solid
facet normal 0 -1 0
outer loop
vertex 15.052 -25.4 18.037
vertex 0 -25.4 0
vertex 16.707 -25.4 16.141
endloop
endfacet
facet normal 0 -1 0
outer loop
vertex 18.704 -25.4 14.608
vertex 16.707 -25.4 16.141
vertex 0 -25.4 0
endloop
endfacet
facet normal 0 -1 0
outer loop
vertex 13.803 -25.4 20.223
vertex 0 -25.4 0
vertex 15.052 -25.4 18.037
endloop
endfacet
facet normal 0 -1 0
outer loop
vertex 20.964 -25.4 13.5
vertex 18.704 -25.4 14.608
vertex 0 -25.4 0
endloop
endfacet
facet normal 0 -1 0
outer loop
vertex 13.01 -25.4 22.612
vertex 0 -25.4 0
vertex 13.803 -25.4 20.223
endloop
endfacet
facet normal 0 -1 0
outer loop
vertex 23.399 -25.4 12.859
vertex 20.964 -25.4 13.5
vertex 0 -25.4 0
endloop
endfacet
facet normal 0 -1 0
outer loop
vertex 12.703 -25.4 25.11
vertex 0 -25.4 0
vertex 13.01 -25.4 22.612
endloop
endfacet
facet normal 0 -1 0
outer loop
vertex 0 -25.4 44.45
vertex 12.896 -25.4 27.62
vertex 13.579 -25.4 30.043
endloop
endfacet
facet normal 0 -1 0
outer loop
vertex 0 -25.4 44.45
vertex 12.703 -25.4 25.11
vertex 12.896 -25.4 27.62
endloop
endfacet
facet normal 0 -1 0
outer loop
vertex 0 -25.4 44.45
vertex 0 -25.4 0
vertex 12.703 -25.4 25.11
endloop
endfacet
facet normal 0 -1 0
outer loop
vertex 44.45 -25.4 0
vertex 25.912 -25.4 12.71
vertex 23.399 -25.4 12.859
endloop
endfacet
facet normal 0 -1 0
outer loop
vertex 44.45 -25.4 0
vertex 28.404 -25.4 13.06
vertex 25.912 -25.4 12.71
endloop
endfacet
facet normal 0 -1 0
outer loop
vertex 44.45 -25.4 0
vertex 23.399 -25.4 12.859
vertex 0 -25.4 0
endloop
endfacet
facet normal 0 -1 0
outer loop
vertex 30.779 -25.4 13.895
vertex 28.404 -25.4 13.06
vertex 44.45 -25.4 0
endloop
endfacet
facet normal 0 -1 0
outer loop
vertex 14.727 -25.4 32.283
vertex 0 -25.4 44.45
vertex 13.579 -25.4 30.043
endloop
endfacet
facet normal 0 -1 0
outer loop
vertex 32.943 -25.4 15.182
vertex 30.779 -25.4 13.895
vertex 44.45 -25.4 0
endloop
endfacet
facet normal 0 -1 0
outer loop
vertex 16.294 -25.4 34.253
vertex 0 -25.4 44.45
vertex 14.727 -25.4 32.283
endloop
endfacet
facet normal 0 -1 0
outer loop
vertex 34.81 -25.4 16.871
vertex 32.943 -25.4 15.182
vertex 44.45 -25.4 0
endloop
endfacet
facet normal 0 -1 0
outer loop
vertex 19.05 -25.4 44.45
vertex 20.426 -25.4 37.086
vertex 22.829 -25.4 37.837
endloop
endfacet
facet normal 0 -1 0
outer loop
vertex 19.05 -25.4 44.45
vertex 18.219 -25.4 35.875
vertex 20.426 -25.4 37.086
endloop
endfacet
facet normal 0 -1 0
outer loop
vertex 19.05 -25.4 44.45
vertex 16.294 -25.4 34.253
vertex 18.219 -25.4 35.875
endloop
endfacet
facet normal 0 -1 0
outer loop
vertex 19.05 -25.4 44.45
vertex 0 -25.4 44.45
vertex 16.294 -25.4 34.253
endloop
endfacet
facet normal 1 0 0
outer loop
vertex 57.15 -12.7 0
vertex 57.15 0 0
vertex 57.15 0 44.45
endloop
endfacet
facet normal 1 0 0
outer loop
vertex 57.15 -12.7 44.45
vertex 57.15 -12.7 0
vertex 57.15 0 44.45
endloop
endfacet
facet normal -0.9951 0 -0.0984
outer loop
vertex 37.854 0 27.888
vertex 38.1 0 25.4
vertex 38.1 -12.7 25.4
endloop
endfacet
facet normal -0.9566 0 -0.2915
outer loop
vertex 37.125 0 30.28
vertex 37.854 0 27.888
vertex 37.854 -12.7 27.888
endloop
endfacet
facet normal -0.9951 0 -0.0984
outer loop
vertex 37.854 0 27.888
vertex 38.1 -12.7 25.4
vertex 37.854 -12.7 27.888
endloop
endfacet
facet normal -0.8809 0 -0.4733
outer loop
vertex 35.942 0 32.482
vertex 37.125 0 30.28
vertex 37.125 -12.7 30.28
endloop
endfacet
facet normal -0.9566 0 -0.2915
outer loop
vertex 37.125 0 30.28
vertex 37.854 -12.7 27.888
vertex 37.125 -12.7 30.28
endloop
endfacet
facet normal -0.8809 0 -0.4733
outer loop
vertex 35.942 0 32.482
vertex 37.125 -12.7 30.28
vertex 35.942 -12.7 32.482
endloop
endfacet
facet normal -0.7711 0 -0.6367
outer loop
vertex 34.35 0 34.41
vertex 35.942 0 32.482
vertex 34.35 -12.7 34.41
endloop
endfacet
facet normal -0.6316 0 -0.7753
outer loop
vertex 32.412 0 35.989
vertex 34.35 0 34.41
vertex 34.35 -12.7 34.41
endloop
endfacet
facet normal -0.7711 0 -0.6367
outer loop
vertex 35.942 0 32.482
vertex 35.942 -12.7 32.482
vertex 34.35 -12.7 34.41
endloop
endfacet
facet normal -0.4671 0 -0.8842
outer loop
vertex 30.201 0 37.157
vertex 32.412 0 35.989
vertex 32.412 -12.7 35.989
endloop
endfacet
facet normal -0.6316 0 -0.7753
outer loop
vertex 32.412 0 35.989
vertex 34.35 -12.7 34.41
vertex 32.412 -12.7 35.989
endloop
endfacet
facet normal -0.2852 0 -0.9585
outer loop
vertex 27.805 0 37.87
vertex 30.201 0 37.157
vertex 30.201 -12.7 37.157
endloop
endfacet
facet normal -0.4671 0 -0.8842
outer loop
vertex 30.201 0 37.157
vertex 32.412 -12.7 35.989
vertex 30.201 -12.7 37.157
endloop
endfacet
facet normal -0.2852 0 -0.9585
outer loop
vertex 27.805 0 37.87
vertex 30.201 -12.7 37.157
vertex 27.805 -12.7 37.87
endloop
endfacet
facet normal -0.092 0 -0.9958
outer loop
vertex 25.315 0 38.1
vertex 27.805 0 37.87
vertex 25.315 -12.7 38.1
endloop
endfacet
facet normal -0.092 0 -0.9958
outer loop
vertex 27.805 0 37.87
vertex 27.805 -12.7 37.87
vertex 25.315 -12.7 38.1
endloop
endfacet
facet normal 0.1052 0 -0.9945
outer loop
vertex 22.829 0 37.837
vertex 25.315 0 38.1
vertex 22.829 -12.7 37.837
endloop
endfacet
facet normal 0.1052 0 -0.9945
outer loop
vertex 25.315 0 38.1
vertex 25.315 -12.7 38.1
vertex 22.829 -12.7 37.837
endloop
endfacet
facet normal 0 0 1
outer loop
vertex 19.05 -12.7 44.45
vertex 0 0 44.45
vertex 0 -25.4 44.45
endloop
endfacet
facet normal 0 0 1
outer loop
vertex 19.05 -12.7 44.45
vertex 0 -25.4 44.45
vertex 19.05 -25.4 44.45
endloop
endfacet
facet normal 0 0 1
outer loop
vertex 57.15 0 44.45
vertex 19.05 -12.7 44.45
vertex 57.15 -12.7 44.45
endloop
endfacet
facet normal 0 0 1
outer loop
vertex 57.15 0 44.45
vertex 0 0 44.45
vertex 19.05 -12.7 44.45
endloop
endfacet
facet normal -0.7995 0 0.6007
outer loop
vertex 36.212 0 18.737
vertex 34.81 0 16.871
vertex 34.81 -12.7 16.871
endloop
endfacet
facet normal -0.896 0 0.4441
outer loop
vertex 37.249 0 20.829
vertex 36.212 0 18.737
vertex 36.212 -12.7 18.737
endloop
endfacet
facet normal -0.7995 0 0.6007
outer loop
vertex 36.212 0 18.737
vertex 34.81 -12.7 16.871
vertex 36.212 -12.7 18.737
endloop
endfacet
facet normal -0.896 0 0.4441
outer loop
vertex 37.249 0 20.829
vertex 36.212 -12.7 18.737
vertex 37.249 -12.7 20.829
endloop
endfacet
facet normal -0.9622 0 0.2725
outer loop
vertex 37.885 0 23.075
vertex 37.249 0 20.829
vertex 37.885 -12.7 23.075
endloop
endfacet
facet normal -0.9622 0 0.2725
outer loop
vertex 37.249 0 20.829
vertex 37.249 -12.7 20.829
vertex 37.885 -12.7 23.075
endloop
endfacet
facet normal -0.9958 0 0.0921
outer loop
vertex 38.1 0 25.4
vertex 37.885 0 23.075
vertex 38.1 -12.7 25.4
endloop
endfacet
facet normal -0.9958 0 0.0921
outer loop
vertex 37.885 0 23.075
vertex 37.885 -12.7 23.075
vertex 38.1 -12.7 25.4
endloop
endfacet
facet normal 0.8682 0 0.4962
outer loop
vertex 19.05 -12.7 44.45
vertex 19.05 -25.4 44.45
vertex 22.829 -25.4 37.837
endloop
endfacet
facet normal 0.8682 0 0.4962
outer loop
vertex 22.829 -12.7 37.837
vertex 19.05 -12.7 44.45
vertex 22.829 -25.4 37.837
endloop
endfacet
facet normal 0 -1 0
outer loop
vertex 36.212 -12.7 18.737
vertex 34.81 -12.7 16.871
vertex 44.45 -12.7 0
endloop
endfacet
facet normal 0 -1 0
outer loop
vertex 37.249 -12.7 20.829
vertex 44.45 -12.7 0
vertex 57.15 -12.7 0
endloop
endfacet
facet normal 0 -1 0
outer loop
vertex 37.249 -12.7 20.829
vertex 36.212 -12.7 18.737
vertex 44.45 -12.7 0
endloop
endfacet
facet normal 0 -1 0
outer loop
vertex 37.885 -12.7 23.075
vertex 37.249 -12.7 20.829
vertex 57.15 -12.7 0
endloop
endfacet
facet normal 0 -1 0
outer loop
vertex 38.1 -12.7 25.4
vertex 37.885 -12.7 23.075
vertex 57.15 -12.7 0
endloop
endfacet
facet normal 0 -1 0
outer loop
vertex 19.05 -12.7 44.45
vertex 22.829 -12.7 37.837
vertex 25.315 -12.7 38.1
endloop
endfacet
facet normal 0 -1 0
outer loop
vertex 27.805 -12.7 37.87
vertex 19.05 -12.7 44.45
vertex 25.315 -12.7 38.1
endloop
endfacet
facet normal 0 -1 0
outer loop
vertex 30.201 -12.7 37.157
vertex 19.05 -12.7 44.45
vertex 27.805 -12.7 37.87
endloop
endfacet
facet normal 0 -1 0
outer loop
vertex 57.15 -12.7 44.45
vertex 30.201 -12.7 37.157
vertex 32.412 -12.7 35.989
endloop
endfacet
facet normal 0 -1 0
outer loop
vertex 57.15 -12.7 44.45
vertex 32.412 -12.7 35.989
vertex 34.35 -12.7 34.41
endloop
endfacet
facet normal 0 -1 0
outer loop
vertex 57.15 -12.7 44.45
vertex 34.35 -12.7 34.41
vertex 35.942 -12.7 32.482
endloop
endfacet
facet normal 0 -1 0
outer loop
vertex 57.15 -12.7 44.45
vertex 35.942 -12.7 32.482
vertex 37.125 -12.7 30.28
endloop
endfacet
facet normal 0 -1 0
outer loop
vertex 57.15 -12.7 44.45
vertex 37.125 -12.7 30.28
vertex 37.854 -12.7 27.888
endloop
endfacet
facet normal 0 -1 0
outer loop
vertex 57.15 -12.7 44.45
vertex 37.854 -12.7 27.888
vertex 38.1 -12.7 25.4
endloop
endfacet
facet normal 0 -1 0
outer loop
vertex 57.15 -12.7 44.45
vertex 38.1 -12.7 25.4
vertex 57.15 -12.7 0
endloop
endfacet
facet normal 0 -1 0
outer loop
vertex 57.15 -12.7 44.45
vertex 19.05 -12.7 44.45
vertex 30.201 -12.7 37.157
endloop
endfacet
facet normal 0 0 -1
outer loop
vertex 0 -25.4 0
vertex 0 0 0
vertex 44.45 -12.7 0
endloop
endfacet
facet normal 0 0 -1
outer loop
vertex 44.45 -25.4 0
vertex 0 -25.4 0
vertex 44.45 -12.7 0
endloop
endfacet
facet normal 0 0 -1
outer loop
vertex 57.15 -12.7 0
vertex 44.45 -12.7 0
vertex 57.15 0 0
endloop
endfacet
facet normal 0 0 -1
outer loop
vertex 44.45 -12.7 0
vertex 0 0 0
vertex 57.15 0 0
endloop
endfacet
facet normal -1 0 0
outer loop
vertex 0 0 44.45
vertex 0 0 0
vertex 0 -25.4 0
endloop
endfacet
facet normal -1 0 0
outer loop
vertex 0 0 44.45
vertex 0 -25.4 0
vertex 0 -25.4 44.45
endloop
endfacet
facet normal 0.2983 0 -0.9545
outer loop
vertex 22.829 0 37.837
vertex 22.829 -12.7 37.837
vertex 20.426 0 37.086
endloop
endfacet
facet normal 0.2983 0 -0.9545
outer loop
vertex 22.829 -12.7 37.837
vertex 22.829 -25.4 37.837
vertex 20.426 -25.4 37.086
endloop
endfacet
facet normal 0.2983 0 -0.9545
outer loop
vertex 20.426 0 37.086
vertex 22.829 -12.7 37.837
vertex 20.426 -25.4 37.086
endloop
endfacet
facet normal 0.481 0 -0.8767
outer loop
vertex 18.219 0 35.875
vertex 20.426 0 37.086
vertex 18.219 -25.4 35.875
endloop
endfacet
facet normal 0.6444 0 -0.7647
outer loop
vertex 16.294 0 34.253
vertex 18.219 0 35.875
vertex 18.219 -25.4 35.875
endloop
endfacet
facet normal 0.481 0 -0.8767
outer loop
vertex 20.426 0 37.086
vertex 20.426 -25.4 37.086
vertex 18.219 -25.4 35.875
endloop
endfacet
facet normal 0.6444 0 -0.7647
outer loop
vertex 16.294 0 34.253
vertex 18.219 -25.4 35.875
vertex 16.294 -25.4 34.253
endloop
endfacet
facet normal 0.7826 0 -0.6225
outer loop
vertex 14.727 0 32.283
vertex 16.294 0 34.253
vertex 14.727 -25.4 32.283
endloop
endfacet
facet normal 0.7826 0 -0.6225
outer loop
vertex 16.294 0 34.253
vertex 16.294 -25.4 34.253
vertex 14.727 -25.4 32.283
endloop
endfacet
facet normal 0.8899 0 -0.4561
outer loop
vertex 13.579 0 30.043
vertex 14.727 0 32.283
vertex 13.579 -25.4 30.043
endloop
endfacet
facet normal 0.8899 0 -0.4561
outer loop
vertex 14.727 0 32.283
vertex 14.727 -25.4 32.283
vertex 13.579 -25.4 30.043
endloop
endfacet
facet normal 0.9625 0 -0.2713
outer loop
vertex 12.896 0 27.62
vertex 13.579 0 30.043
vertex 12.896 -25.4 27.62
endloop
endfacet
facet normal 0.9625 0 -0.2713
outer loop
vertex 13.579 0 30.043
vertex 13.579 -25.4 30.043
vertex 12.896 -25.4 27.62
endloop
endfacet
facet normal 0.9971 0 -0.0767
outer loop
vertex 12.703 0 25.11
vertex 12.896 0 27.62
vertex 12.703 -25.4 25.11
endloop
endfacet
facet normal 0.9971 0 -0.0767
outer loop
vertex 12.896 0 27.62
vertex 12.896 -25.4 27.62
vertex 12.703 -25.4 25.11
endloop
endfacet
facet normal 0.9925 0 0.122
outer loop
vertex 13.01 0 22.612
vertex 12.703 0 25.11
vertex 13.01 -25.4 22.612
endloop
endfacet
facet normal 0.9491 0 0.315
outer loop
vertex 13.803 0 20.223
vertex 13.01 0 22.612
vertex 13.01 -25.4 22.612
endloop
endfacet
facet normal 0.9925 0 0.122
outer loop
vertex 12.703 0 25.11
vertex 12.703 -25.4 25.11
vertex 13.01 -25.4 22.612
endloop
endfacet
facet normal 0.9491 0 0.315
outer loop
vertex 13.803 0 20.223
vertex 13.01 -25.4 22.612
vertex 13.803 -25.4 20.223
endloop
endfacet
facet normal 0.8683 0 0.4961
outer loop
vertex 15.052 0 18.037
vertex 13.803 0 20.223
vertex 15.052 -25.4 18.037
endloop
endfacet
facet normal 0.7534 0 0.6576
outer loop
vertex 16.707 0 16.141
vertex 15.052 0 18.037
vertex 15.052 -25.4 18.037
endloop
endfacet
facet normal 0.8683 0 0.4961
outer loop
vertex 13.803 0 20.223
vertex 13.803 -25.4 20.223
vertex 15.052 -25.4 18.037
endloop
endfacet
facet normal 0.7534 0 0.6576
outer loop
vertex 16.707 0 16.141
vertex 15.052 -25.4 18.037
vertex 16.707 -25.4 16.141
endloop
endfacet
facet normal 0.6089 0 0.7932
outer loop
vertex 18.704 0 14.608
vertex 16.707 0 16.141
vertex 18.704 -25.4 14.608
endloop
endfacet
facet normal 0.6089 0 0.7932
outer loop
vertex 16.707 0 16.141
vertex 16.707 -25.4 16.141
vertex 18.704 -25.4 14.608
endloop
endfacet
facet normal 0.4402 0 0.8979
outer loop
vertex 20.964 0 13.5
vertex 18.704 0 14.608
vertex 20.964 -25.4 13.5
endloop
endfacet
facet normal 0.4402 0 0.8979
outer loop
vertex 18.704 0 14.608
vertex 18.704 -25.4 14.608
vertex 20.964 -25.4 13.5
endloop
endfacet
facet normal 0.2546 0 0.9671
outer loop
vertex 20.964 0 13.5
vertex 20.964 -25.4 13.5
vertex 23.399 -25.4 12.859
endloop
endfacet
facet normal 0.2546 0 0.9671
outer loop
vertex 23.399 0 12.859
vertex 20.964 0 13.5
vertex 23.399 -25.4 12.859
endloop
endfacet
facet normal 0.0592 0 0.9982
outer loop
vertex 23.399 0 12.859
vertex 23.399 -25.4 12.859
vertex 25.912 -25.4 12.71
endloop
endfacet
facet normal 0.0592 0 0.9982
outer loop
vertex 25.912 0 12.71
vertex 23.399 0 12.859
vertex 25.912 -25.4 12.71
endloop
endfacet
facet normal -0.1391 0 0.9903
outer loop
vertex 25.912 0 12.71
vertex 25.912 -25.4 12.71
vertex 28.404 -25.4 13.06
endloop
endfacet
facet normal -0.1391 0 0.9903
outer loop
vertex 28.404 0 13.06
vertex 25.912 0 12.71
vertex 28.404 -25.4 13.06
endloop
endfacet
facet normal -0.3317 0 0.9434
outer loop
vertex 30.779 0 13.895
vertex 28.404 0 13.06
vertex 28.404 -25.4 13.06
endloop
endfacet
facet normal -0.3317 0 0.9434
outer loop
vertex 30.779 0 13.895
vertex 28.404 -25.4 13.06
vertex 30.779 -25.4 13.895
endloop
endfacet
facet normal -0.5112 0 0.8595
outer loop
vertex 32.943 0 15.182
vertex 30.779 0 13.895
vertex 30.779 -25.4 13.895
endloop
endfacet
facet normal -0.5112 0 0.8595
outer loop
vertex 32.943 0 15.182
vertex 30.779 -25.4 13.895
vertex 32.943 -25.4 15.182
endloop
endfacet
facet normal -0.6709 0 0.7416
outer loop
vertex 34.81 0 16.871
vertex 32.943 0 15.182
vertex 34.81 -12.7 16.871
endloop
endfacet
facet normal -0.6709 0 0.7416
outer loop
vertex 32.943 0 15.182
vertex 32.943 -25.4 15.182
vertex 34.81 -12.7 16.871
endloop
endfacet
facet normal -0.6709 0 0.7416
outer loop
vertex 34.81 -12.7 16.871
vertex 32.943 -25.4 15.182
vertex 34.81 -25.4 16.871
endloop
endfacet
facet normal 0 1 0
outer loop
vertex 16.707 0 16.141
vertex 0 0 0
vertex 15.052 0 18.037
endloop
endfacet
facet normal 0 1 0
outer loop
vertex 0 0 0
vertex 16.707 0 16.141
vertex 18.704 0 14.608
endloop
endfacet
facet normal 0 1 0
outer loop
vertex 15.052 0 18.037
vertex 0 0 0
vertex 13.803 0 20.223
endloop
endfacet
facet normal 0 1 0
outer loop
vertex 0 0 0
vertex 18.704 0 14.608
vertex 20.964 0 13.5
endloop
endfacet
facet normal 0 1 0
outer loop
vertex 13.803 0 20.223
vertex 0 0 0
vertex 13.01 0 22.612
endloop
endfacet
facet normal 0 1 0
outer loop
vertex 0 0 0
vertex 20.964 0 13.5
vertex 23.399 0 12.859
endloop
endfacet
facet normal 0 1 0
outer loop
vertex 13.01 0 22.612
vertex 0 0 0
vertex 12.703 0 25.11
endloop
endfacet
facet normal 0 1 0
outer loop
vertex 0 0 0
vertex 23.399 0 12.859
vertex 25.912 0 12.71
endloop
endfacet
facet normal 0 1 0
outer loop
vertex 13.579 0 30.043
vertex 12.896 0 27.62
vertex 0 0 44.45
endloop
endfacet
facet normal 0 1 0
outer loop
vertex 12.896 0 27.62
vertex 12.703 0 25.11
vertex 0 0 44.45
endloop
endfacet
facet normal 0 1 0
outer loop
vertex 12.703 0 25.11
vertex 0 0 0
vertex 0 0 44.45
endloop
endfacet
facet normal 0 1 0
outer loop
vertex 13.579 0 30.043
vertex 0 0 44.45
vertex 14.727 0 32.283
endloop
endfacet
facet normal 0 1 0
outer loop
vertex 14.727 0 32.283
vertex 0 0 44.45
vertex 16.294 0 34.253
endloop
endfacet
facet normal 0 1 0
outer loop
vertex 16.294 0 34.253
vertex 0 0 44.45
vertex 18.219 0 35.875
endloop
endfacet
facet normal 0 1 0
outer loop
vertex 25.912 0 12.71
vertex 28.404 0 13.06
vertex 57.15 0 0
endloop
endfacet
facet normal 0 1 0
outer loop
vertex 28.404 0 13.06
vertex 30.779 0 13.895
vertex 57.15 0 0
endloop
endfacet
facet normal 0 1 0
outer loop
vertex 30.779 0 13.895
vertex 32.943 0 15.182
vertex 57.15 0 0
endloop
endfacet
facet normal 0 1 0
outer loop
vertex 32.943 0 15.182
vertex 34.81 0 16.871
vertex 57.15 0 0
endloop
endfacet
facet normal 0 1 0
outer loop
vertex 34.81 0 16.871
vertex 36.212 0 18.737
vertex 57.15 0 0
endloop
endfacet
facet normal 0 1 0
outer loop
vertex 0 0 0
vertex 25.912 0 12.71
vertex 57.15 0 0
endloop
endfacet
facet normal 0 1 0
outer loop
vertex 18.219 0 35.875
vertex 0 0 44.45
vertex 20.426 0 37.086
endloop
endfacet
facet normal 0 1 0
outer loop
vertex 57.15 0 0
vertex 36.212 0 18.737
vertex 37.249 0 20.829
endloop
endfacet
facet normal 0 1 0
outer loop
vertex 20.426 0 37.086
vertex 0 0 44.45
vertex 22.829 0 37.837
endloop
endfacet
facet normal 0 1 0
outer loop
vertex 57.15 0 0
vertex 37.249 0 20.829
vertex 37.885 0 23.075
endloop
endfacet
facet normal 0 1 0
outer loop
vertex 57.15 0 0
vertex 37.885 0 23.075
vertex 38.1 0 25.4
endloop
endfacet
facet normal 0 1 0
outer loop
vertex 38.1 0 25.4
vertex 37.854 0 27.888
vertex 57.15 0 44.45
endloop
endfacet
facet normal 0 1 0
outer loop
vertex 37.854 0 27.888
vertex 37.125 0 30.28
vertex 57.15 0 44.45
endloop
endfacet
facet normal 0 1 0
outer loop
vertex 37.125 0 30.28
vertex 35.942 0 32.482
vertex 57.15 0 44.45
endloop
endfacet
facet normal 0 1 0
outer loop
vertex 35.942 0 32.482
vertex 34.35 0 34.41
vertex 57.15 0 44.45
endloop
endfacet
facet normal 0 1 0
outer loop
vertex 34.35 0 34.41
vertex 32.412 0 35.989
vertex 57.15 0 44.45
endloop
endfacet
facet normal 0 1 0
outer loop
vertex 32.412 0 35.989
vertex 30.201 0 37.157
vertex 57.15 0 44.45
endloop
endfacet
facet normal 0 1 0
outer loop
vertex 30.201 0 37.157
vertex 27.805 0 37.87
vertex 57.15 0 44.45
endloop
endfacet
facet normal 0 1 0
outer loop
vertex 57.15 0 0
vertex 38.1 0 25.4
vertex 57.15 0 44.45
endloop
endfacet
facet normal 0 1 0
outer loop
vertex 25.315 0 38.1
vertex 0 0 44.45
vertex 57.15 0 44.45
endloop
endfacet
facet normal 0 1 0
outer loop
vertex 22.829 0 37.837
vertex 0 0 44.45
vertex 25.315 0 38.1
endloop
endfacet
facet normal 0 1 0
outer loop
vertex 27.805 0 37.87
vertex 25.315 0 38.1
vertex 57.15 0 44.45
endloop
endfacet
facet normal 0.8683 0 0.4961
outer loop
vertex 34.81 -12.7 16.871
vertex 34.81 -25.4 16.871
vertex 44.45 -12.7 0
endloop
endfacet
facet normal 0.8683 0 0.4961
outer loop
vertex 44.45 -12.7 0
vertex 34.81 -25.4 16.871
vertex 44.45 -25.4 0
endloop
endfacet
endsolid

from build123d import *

# Parameters (mm, degrees)
F0_W     = 57.15
F0_H     = 44.45
F1_DEPTH = 25.4
F3_DEPTH = 12.7
F4_DEPTH = 25.4


with BuildPart() as f1:
    # F0 (on Front) → F1 (new body)
    with BuildSketch(Plane.XZ):
        with Locations((28.575, 22.225)):
            Rectangle(F0_W, F0_H)
    extrude(amount=F1_DEPTH)

    # F2 (on face) → F3 (cut)
    with BuildSketch(Plane.XZ.offset(25.4)):
        with BuildLine():
            Line((57.15, 44.45), (19.05, 44.45))
            Line((19.05, 44.45), (22.8288518953, 37.8370091832))
            ThreePointArc((22.8288518953, 37.8370091832), (33.4198634362, 35.2474255755), (38.1, 25.4))
            ThreePointArc((38.1, 25.4), (37.2488826998, 20.8290068075), (34.8096096432, 16.8706831245))
            Line((34.8096096432, 16.8706831245), (44.45, 0))
            Line((44.45, 0), (57.15, 0))
            Line((57.15, 0), (57.15, 44.45))
        make_face()
    extrude(amount=-F3_DEPTH, mode=Mode.SUBTRACT)

    # F2 (on face) → F4 (cut)
    with BuildSketch(Plane.XZ.offset(25.4)):
        with BuildLine():
            Line((34.8096096432, 16.8706831245), (22.8288518953, 37.8370091832))
            ThreePointArc((22.8288518953, 37.8370091832), (14.373312095, 19.0990354829), (34.8096096432, 16.8706831245))
        make_face()
        with BuildLine():
            ThreePointArc((38.1, 25.4), (33.4198634362, 35.2474255755), (22.8288518953, 37.8370091832))
            Line((22.8288518953, 37.8370091832), (34.8096096432, 16.8706831245))
            ThreePointArc((34.8096096432, 16.8706831245), (37.2488826998, 20.8290068075), (38.1, 25.4))
        make_face()
    extrude(amount=-F4_DEPTH, mode=Mode.SUBTRACT)


solid = f1.part
